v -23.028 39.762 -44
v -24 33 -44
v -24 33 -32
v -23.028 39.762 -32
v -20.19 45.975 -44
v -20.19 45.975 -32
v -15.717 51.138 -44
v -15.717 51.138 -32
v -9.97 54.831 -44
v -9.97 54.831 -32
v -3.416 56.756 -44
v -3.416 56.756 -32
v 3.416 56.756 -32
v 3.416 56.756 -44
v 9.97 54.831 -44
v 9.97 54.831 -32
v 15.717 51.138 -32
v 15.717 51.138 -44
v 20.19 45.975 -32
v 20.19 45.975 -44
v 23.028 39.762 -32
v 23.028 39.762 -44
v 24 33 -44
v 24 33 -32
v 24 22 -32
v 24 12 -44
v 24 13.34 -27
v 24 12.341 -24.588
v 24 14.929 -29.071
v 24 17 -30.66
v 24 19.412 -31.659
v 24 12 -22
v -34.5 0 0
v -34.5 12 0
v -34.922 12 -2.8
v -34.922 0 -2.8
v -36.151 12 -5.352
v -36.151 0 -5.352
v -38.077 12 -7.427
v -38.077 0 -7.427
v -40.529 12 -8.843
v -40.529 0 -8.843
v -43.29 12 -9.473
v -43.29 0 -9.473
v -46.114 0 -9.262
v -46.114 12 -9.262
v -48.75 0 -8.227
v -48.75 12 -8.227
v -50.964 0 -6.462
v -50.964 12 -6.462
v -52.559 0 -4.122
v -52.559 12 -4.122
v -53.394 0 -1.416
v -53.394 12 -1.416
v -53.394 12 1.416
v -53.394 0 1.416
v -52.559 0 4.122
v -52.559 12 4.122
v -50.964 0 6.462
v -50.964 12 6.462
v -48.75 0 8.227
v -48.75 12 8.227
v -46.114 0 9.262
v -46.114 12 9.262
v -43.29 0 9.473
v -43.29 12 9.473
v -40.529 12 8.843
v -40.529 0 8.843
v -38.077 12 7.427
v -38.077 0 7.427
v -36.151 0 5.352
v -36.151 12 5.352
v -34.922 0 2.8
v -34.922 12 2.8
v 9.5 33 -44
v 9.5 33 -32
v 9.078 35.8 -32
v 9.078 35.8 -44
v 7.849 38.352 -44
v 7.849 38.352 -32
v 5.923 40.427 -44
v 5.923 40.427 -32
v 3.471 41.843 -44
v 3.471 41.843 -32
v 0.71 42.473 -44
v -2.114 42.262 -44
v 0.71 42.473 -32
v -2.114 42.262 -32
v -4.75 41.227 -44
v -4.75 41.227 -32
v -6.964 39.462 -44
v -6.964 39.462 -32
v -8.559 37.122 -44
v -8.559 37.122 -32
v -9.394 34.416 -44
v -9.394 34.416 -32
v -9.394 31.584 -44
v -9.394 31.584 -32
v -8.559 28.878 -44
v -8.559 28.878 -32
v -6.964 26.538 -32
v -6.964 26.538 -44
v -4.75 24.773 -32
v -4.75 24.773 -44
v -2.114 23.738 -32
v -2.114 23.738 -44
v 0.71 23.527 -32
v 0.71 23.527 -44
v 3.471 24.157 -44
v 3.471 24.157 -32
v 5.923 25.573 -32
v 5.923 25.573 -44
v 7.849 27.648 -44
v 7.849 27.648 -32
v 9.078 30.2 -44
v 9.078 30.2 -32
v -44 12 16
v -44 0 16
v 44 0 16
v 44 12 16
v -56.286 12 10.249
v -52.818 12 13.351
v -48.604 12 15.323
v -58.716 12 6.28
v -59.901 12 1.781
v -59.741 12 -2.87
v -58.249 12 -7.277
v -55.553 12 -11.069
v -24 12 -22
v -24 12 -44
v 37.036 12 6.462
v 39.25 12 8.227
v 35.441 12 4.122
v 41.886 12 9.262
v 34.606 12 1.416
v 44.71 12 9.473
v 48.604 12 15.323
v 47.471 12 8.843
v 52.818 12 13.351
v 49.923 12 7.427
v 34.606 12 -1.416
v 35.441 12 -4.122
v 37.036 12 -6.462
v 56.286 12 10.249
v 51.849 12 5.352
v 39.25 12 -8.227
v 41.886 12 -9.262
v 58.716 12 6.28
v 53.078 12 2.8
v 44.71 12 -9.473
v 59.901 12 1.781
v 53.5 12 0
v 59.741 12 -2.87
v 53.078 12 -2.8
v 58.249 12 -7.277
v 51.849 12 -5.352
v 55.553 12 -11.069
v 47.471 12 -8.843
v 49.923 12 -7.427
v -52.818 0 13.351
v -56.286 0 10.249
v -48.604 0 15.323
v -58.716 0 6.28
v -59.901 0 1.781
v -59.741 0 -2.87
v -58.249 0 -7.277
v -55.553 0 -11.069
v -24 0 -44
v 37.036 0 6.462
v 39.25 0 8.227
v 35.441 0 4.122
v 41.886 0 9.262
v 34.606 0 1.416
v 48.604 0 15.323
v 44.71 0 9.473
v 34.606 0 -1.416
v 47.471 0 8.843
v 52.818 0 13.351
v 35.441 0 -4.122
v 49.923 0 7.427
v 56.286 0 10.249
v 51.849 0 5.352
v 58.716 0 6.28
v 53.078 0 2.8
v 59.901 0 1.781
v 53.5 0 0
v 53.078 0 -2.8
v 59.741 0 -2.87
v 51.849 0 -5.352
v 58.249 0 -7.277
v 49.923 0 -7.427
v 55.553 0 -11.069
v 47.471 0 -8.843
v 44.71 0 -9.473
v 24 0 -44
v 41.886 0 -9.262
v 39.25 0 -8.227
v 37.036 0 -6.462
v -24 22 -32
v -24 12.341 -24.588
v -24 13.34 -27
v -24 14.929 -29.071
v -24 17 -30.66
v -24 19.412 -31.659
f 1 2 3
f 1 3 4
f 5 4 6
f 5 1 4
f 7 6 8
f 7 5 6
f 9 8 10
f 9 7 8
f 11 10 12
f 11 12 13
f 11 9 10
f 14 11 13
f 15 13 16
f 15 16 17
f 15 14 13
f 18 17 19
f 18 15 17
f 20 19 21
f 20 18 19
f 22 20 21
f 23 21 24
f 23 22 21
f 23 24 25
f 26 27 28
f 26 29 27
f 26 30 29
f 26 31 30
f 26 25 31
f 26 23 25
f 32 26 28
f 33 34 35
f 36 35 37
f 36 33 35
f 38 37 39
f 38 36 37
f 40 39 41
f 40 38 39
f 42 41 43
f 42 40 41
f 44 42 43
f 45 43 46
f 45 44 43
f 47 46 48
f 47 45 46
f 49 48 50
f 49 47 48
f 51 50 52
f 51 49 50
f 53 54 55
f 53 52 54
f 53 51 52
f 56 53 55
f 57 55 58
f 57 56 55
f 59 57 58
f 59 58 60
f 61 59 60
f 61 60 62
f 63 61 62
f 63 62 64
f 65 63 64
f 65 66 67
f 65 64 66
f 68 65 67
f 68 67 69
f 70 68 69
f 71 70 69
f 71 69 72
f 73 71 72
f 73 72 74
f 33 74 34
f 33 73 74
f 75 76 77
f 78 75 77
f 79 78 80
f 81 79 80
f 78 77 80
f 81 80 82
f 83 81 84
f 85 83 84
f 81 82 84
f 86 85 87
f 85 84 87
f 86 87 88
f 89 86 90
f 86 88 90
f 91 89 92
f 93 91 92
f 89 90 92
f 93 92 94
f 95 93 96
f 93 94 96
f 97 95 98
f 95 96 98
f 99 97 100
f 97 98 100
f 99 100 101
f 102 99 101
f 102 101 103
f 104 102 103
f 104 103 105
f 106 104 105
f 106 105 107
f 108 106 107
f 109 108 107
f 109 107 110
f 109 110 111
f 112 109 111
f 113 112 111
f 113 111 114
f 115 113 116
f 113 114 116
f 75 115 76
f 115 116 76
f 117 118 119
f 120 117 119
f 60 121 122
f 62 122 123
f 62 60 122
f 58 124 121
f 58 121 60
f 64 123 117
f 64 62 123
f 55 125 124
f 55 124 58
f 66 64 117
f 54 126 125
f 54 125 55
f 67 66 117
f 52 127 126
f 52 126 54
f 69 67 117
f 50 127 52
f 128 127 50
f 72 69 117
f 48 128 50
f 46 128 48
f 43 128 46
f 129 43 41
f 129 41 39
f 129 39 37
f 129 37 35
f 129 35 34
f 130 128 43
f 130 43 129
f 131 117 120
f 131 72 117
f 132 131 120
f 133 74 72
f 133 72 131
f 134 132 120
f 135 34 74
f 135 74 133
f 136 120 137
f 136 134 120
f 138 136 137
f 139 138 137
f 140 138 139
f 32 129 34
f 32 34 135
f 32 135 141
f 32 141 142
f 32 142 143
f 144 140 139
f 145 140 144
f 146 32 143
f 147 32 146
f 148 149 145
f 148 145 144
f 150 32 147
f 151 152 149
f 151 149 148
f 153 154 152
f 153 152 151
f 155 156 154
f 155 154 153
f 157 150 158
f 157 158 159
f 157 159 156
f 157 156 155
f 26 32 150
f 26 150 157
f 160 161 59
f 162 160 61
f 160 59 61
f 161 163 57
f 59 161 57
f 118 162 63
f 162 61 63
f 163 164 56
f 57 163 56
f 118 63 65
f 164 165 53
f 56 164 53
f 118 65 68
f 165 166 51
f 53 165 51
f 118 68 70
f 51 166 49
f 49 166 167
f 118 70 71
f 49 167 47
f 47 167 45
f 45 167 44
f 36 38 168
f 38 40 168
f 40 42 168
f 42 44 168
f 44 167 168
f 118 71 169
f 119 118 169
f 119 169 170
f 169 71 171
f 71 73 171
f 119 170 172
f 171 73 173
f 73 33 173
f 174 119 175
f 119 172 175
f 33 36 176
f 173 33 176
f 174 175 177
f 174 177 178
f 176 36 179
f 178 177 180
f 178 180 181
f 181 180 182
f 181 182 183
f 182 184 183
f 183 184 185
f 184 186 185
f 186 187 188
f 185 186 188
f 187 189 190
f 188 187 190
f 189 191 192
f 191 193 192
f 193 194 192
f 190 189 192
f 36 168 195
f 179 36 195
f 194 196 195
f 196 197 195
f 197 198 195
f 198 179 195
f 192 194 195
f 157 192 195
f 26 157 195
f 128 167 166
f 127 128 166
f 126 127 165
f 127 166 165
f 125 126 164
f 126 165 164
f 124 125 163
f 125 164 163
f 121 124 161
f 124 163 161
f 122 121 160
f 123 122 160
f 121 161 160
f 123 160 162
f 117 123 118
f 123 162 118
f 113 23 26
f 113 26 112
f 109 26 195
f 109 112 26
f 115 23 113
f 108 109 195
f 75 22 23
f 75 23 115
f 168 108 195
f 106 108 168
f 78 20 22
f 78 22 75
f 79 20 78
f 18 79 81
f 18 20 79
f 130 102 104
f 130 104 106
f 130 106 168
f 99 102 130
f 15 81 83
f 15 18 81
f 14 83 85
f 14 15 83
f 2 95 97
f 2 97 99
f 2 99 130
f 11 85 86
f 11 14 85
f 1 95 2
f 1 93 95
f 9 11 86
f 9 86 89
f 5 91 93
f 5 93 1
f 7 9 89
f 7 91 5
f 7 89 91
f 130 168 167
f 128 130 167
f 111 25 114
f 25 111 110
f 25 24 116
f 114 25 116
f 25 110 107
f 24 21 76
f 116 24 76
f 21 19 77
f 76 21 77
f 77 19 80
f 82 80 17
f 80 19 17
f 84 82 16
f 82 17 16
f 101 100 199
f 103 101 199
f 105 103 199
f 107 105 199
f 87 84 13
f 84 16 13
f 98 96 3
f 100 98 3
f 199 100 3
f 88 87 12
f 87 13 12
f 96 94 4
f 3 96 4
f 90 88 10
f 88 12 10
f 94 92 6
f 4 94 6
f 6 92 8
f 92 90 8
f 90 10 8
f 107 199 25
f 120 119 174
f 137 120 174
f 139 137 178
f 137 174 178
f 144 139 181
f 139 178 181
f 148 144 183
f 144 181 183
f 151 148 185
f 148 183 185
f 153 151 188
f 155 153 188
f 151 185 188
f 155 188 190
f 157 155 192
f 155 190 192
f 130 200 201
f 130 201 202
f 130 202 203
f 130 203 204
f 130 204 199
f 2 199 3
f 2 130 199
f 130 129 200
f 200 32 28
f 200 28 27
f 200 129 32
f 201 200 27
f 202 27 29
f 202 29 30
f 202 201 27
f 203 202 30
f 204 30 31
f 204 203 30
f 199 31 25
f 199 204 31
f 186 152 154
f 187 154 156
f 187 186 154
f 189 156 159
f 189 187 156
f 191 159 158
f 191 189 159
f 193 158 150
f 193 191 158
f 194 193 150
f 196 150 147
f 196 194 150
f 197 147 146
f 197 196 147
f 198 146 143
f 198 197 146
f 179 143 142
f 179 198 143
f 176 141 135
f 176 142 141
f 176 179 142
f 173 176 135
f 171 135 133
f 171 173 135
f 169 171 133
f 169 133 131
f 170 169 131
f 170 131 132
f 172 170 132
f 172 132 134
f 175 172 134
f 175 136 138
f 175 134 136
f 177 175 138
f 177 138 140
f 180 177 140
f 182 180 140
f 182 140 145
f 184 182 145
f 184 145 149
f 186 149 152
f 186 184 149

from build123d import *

# Parameters (mm, degrees)
EXTRUDE_3_DEPTH     = 12
SKETCH_10_R         = 9.5
CUT_EXTRUDE_4_DEPTH = 13
EXTRUDE_4_DEPTH     = 12
SKETCH_12_R         = 9.5
CUT_EXTRUDE_5_DEPTH = 12
FILLET_1_R          = 10


with BuildPart() as part:
    # 스케치8 → 보스-돌출3 (new body)
    with BuildSketch(Plane(origin=(0, 0, 0), x_dir=(1, 0, 0), z_dir=(0, 1, 0))):
        with BuildLine():
            Line((-44, -16), (44, -16))
            ThreePointArc((44, -16), (58.715829405, -6.280474897), (55.552799645, 11.069454384))
            Line((55.552799645, 11.069454384), (24, 44))
            Line((24, 44), (-24, 44))
            Line((-24, 44), (-55.552799645, 11.069454384))
            ThreePointArc((-55.552799645, 11.069454384), (-58.715829405, -6.280474897), (-44, -16))
        make_face()
    extrude(amount=EXTRUDE_3_DEPTH)

    # 스케치10 → 컷-돌출4 (cut, through all)
    with BuildSketch(Plane(origin=(0, 0, 0), x_dir=(1, 0, 0), z_dir=(0, 1, 0))):
        with Locations((-44, 0)):
            Circle(SKETCH_10_R)
        with Locations((44, 0)):
            Circle(SKETCH_10_R)
    extrude(amount=CUT_EXTRUDE_4_DEPTH, mode=Mode.SUBTRACT)

    # 스케치11 → 보스-돌출4 (add)
    with BuildSketch(Plane(origin=(0, 0, -44), x_dir=(-1, 0, 0), z_dir=(0, 0, -1))):
        with BuildLine():
            Line((-24, 33), (-24, 0))
            Line((-24, 0), (24, 0))
            Line((24, 0), (24, 33))
            ThreePointArc((24, 33), (0, 57), (-24, 33))
        make_face()
    extrude(amount=-EXTRUDE_4_DEPTH)

    # 스케치12 → 컷-돌출5 (cut)
    with BuildSketch(Plane.XY.offset(-32)):
        with Locations((0, 33)):
            Circle(SKETCH_12_R)
    extrude(amount=-CUT_EXTRUDE_5_DEPTH, mode=Mode.SUBTRACT)

    # 필렛1
    fillet_1_edges = [part.edges().sort_by_distance(p)[0] for p in [
        (0, 12, -32),
    ]]
    fillet(fillet_1_edges, radius=FILLET_1_R)


solid = part.part
